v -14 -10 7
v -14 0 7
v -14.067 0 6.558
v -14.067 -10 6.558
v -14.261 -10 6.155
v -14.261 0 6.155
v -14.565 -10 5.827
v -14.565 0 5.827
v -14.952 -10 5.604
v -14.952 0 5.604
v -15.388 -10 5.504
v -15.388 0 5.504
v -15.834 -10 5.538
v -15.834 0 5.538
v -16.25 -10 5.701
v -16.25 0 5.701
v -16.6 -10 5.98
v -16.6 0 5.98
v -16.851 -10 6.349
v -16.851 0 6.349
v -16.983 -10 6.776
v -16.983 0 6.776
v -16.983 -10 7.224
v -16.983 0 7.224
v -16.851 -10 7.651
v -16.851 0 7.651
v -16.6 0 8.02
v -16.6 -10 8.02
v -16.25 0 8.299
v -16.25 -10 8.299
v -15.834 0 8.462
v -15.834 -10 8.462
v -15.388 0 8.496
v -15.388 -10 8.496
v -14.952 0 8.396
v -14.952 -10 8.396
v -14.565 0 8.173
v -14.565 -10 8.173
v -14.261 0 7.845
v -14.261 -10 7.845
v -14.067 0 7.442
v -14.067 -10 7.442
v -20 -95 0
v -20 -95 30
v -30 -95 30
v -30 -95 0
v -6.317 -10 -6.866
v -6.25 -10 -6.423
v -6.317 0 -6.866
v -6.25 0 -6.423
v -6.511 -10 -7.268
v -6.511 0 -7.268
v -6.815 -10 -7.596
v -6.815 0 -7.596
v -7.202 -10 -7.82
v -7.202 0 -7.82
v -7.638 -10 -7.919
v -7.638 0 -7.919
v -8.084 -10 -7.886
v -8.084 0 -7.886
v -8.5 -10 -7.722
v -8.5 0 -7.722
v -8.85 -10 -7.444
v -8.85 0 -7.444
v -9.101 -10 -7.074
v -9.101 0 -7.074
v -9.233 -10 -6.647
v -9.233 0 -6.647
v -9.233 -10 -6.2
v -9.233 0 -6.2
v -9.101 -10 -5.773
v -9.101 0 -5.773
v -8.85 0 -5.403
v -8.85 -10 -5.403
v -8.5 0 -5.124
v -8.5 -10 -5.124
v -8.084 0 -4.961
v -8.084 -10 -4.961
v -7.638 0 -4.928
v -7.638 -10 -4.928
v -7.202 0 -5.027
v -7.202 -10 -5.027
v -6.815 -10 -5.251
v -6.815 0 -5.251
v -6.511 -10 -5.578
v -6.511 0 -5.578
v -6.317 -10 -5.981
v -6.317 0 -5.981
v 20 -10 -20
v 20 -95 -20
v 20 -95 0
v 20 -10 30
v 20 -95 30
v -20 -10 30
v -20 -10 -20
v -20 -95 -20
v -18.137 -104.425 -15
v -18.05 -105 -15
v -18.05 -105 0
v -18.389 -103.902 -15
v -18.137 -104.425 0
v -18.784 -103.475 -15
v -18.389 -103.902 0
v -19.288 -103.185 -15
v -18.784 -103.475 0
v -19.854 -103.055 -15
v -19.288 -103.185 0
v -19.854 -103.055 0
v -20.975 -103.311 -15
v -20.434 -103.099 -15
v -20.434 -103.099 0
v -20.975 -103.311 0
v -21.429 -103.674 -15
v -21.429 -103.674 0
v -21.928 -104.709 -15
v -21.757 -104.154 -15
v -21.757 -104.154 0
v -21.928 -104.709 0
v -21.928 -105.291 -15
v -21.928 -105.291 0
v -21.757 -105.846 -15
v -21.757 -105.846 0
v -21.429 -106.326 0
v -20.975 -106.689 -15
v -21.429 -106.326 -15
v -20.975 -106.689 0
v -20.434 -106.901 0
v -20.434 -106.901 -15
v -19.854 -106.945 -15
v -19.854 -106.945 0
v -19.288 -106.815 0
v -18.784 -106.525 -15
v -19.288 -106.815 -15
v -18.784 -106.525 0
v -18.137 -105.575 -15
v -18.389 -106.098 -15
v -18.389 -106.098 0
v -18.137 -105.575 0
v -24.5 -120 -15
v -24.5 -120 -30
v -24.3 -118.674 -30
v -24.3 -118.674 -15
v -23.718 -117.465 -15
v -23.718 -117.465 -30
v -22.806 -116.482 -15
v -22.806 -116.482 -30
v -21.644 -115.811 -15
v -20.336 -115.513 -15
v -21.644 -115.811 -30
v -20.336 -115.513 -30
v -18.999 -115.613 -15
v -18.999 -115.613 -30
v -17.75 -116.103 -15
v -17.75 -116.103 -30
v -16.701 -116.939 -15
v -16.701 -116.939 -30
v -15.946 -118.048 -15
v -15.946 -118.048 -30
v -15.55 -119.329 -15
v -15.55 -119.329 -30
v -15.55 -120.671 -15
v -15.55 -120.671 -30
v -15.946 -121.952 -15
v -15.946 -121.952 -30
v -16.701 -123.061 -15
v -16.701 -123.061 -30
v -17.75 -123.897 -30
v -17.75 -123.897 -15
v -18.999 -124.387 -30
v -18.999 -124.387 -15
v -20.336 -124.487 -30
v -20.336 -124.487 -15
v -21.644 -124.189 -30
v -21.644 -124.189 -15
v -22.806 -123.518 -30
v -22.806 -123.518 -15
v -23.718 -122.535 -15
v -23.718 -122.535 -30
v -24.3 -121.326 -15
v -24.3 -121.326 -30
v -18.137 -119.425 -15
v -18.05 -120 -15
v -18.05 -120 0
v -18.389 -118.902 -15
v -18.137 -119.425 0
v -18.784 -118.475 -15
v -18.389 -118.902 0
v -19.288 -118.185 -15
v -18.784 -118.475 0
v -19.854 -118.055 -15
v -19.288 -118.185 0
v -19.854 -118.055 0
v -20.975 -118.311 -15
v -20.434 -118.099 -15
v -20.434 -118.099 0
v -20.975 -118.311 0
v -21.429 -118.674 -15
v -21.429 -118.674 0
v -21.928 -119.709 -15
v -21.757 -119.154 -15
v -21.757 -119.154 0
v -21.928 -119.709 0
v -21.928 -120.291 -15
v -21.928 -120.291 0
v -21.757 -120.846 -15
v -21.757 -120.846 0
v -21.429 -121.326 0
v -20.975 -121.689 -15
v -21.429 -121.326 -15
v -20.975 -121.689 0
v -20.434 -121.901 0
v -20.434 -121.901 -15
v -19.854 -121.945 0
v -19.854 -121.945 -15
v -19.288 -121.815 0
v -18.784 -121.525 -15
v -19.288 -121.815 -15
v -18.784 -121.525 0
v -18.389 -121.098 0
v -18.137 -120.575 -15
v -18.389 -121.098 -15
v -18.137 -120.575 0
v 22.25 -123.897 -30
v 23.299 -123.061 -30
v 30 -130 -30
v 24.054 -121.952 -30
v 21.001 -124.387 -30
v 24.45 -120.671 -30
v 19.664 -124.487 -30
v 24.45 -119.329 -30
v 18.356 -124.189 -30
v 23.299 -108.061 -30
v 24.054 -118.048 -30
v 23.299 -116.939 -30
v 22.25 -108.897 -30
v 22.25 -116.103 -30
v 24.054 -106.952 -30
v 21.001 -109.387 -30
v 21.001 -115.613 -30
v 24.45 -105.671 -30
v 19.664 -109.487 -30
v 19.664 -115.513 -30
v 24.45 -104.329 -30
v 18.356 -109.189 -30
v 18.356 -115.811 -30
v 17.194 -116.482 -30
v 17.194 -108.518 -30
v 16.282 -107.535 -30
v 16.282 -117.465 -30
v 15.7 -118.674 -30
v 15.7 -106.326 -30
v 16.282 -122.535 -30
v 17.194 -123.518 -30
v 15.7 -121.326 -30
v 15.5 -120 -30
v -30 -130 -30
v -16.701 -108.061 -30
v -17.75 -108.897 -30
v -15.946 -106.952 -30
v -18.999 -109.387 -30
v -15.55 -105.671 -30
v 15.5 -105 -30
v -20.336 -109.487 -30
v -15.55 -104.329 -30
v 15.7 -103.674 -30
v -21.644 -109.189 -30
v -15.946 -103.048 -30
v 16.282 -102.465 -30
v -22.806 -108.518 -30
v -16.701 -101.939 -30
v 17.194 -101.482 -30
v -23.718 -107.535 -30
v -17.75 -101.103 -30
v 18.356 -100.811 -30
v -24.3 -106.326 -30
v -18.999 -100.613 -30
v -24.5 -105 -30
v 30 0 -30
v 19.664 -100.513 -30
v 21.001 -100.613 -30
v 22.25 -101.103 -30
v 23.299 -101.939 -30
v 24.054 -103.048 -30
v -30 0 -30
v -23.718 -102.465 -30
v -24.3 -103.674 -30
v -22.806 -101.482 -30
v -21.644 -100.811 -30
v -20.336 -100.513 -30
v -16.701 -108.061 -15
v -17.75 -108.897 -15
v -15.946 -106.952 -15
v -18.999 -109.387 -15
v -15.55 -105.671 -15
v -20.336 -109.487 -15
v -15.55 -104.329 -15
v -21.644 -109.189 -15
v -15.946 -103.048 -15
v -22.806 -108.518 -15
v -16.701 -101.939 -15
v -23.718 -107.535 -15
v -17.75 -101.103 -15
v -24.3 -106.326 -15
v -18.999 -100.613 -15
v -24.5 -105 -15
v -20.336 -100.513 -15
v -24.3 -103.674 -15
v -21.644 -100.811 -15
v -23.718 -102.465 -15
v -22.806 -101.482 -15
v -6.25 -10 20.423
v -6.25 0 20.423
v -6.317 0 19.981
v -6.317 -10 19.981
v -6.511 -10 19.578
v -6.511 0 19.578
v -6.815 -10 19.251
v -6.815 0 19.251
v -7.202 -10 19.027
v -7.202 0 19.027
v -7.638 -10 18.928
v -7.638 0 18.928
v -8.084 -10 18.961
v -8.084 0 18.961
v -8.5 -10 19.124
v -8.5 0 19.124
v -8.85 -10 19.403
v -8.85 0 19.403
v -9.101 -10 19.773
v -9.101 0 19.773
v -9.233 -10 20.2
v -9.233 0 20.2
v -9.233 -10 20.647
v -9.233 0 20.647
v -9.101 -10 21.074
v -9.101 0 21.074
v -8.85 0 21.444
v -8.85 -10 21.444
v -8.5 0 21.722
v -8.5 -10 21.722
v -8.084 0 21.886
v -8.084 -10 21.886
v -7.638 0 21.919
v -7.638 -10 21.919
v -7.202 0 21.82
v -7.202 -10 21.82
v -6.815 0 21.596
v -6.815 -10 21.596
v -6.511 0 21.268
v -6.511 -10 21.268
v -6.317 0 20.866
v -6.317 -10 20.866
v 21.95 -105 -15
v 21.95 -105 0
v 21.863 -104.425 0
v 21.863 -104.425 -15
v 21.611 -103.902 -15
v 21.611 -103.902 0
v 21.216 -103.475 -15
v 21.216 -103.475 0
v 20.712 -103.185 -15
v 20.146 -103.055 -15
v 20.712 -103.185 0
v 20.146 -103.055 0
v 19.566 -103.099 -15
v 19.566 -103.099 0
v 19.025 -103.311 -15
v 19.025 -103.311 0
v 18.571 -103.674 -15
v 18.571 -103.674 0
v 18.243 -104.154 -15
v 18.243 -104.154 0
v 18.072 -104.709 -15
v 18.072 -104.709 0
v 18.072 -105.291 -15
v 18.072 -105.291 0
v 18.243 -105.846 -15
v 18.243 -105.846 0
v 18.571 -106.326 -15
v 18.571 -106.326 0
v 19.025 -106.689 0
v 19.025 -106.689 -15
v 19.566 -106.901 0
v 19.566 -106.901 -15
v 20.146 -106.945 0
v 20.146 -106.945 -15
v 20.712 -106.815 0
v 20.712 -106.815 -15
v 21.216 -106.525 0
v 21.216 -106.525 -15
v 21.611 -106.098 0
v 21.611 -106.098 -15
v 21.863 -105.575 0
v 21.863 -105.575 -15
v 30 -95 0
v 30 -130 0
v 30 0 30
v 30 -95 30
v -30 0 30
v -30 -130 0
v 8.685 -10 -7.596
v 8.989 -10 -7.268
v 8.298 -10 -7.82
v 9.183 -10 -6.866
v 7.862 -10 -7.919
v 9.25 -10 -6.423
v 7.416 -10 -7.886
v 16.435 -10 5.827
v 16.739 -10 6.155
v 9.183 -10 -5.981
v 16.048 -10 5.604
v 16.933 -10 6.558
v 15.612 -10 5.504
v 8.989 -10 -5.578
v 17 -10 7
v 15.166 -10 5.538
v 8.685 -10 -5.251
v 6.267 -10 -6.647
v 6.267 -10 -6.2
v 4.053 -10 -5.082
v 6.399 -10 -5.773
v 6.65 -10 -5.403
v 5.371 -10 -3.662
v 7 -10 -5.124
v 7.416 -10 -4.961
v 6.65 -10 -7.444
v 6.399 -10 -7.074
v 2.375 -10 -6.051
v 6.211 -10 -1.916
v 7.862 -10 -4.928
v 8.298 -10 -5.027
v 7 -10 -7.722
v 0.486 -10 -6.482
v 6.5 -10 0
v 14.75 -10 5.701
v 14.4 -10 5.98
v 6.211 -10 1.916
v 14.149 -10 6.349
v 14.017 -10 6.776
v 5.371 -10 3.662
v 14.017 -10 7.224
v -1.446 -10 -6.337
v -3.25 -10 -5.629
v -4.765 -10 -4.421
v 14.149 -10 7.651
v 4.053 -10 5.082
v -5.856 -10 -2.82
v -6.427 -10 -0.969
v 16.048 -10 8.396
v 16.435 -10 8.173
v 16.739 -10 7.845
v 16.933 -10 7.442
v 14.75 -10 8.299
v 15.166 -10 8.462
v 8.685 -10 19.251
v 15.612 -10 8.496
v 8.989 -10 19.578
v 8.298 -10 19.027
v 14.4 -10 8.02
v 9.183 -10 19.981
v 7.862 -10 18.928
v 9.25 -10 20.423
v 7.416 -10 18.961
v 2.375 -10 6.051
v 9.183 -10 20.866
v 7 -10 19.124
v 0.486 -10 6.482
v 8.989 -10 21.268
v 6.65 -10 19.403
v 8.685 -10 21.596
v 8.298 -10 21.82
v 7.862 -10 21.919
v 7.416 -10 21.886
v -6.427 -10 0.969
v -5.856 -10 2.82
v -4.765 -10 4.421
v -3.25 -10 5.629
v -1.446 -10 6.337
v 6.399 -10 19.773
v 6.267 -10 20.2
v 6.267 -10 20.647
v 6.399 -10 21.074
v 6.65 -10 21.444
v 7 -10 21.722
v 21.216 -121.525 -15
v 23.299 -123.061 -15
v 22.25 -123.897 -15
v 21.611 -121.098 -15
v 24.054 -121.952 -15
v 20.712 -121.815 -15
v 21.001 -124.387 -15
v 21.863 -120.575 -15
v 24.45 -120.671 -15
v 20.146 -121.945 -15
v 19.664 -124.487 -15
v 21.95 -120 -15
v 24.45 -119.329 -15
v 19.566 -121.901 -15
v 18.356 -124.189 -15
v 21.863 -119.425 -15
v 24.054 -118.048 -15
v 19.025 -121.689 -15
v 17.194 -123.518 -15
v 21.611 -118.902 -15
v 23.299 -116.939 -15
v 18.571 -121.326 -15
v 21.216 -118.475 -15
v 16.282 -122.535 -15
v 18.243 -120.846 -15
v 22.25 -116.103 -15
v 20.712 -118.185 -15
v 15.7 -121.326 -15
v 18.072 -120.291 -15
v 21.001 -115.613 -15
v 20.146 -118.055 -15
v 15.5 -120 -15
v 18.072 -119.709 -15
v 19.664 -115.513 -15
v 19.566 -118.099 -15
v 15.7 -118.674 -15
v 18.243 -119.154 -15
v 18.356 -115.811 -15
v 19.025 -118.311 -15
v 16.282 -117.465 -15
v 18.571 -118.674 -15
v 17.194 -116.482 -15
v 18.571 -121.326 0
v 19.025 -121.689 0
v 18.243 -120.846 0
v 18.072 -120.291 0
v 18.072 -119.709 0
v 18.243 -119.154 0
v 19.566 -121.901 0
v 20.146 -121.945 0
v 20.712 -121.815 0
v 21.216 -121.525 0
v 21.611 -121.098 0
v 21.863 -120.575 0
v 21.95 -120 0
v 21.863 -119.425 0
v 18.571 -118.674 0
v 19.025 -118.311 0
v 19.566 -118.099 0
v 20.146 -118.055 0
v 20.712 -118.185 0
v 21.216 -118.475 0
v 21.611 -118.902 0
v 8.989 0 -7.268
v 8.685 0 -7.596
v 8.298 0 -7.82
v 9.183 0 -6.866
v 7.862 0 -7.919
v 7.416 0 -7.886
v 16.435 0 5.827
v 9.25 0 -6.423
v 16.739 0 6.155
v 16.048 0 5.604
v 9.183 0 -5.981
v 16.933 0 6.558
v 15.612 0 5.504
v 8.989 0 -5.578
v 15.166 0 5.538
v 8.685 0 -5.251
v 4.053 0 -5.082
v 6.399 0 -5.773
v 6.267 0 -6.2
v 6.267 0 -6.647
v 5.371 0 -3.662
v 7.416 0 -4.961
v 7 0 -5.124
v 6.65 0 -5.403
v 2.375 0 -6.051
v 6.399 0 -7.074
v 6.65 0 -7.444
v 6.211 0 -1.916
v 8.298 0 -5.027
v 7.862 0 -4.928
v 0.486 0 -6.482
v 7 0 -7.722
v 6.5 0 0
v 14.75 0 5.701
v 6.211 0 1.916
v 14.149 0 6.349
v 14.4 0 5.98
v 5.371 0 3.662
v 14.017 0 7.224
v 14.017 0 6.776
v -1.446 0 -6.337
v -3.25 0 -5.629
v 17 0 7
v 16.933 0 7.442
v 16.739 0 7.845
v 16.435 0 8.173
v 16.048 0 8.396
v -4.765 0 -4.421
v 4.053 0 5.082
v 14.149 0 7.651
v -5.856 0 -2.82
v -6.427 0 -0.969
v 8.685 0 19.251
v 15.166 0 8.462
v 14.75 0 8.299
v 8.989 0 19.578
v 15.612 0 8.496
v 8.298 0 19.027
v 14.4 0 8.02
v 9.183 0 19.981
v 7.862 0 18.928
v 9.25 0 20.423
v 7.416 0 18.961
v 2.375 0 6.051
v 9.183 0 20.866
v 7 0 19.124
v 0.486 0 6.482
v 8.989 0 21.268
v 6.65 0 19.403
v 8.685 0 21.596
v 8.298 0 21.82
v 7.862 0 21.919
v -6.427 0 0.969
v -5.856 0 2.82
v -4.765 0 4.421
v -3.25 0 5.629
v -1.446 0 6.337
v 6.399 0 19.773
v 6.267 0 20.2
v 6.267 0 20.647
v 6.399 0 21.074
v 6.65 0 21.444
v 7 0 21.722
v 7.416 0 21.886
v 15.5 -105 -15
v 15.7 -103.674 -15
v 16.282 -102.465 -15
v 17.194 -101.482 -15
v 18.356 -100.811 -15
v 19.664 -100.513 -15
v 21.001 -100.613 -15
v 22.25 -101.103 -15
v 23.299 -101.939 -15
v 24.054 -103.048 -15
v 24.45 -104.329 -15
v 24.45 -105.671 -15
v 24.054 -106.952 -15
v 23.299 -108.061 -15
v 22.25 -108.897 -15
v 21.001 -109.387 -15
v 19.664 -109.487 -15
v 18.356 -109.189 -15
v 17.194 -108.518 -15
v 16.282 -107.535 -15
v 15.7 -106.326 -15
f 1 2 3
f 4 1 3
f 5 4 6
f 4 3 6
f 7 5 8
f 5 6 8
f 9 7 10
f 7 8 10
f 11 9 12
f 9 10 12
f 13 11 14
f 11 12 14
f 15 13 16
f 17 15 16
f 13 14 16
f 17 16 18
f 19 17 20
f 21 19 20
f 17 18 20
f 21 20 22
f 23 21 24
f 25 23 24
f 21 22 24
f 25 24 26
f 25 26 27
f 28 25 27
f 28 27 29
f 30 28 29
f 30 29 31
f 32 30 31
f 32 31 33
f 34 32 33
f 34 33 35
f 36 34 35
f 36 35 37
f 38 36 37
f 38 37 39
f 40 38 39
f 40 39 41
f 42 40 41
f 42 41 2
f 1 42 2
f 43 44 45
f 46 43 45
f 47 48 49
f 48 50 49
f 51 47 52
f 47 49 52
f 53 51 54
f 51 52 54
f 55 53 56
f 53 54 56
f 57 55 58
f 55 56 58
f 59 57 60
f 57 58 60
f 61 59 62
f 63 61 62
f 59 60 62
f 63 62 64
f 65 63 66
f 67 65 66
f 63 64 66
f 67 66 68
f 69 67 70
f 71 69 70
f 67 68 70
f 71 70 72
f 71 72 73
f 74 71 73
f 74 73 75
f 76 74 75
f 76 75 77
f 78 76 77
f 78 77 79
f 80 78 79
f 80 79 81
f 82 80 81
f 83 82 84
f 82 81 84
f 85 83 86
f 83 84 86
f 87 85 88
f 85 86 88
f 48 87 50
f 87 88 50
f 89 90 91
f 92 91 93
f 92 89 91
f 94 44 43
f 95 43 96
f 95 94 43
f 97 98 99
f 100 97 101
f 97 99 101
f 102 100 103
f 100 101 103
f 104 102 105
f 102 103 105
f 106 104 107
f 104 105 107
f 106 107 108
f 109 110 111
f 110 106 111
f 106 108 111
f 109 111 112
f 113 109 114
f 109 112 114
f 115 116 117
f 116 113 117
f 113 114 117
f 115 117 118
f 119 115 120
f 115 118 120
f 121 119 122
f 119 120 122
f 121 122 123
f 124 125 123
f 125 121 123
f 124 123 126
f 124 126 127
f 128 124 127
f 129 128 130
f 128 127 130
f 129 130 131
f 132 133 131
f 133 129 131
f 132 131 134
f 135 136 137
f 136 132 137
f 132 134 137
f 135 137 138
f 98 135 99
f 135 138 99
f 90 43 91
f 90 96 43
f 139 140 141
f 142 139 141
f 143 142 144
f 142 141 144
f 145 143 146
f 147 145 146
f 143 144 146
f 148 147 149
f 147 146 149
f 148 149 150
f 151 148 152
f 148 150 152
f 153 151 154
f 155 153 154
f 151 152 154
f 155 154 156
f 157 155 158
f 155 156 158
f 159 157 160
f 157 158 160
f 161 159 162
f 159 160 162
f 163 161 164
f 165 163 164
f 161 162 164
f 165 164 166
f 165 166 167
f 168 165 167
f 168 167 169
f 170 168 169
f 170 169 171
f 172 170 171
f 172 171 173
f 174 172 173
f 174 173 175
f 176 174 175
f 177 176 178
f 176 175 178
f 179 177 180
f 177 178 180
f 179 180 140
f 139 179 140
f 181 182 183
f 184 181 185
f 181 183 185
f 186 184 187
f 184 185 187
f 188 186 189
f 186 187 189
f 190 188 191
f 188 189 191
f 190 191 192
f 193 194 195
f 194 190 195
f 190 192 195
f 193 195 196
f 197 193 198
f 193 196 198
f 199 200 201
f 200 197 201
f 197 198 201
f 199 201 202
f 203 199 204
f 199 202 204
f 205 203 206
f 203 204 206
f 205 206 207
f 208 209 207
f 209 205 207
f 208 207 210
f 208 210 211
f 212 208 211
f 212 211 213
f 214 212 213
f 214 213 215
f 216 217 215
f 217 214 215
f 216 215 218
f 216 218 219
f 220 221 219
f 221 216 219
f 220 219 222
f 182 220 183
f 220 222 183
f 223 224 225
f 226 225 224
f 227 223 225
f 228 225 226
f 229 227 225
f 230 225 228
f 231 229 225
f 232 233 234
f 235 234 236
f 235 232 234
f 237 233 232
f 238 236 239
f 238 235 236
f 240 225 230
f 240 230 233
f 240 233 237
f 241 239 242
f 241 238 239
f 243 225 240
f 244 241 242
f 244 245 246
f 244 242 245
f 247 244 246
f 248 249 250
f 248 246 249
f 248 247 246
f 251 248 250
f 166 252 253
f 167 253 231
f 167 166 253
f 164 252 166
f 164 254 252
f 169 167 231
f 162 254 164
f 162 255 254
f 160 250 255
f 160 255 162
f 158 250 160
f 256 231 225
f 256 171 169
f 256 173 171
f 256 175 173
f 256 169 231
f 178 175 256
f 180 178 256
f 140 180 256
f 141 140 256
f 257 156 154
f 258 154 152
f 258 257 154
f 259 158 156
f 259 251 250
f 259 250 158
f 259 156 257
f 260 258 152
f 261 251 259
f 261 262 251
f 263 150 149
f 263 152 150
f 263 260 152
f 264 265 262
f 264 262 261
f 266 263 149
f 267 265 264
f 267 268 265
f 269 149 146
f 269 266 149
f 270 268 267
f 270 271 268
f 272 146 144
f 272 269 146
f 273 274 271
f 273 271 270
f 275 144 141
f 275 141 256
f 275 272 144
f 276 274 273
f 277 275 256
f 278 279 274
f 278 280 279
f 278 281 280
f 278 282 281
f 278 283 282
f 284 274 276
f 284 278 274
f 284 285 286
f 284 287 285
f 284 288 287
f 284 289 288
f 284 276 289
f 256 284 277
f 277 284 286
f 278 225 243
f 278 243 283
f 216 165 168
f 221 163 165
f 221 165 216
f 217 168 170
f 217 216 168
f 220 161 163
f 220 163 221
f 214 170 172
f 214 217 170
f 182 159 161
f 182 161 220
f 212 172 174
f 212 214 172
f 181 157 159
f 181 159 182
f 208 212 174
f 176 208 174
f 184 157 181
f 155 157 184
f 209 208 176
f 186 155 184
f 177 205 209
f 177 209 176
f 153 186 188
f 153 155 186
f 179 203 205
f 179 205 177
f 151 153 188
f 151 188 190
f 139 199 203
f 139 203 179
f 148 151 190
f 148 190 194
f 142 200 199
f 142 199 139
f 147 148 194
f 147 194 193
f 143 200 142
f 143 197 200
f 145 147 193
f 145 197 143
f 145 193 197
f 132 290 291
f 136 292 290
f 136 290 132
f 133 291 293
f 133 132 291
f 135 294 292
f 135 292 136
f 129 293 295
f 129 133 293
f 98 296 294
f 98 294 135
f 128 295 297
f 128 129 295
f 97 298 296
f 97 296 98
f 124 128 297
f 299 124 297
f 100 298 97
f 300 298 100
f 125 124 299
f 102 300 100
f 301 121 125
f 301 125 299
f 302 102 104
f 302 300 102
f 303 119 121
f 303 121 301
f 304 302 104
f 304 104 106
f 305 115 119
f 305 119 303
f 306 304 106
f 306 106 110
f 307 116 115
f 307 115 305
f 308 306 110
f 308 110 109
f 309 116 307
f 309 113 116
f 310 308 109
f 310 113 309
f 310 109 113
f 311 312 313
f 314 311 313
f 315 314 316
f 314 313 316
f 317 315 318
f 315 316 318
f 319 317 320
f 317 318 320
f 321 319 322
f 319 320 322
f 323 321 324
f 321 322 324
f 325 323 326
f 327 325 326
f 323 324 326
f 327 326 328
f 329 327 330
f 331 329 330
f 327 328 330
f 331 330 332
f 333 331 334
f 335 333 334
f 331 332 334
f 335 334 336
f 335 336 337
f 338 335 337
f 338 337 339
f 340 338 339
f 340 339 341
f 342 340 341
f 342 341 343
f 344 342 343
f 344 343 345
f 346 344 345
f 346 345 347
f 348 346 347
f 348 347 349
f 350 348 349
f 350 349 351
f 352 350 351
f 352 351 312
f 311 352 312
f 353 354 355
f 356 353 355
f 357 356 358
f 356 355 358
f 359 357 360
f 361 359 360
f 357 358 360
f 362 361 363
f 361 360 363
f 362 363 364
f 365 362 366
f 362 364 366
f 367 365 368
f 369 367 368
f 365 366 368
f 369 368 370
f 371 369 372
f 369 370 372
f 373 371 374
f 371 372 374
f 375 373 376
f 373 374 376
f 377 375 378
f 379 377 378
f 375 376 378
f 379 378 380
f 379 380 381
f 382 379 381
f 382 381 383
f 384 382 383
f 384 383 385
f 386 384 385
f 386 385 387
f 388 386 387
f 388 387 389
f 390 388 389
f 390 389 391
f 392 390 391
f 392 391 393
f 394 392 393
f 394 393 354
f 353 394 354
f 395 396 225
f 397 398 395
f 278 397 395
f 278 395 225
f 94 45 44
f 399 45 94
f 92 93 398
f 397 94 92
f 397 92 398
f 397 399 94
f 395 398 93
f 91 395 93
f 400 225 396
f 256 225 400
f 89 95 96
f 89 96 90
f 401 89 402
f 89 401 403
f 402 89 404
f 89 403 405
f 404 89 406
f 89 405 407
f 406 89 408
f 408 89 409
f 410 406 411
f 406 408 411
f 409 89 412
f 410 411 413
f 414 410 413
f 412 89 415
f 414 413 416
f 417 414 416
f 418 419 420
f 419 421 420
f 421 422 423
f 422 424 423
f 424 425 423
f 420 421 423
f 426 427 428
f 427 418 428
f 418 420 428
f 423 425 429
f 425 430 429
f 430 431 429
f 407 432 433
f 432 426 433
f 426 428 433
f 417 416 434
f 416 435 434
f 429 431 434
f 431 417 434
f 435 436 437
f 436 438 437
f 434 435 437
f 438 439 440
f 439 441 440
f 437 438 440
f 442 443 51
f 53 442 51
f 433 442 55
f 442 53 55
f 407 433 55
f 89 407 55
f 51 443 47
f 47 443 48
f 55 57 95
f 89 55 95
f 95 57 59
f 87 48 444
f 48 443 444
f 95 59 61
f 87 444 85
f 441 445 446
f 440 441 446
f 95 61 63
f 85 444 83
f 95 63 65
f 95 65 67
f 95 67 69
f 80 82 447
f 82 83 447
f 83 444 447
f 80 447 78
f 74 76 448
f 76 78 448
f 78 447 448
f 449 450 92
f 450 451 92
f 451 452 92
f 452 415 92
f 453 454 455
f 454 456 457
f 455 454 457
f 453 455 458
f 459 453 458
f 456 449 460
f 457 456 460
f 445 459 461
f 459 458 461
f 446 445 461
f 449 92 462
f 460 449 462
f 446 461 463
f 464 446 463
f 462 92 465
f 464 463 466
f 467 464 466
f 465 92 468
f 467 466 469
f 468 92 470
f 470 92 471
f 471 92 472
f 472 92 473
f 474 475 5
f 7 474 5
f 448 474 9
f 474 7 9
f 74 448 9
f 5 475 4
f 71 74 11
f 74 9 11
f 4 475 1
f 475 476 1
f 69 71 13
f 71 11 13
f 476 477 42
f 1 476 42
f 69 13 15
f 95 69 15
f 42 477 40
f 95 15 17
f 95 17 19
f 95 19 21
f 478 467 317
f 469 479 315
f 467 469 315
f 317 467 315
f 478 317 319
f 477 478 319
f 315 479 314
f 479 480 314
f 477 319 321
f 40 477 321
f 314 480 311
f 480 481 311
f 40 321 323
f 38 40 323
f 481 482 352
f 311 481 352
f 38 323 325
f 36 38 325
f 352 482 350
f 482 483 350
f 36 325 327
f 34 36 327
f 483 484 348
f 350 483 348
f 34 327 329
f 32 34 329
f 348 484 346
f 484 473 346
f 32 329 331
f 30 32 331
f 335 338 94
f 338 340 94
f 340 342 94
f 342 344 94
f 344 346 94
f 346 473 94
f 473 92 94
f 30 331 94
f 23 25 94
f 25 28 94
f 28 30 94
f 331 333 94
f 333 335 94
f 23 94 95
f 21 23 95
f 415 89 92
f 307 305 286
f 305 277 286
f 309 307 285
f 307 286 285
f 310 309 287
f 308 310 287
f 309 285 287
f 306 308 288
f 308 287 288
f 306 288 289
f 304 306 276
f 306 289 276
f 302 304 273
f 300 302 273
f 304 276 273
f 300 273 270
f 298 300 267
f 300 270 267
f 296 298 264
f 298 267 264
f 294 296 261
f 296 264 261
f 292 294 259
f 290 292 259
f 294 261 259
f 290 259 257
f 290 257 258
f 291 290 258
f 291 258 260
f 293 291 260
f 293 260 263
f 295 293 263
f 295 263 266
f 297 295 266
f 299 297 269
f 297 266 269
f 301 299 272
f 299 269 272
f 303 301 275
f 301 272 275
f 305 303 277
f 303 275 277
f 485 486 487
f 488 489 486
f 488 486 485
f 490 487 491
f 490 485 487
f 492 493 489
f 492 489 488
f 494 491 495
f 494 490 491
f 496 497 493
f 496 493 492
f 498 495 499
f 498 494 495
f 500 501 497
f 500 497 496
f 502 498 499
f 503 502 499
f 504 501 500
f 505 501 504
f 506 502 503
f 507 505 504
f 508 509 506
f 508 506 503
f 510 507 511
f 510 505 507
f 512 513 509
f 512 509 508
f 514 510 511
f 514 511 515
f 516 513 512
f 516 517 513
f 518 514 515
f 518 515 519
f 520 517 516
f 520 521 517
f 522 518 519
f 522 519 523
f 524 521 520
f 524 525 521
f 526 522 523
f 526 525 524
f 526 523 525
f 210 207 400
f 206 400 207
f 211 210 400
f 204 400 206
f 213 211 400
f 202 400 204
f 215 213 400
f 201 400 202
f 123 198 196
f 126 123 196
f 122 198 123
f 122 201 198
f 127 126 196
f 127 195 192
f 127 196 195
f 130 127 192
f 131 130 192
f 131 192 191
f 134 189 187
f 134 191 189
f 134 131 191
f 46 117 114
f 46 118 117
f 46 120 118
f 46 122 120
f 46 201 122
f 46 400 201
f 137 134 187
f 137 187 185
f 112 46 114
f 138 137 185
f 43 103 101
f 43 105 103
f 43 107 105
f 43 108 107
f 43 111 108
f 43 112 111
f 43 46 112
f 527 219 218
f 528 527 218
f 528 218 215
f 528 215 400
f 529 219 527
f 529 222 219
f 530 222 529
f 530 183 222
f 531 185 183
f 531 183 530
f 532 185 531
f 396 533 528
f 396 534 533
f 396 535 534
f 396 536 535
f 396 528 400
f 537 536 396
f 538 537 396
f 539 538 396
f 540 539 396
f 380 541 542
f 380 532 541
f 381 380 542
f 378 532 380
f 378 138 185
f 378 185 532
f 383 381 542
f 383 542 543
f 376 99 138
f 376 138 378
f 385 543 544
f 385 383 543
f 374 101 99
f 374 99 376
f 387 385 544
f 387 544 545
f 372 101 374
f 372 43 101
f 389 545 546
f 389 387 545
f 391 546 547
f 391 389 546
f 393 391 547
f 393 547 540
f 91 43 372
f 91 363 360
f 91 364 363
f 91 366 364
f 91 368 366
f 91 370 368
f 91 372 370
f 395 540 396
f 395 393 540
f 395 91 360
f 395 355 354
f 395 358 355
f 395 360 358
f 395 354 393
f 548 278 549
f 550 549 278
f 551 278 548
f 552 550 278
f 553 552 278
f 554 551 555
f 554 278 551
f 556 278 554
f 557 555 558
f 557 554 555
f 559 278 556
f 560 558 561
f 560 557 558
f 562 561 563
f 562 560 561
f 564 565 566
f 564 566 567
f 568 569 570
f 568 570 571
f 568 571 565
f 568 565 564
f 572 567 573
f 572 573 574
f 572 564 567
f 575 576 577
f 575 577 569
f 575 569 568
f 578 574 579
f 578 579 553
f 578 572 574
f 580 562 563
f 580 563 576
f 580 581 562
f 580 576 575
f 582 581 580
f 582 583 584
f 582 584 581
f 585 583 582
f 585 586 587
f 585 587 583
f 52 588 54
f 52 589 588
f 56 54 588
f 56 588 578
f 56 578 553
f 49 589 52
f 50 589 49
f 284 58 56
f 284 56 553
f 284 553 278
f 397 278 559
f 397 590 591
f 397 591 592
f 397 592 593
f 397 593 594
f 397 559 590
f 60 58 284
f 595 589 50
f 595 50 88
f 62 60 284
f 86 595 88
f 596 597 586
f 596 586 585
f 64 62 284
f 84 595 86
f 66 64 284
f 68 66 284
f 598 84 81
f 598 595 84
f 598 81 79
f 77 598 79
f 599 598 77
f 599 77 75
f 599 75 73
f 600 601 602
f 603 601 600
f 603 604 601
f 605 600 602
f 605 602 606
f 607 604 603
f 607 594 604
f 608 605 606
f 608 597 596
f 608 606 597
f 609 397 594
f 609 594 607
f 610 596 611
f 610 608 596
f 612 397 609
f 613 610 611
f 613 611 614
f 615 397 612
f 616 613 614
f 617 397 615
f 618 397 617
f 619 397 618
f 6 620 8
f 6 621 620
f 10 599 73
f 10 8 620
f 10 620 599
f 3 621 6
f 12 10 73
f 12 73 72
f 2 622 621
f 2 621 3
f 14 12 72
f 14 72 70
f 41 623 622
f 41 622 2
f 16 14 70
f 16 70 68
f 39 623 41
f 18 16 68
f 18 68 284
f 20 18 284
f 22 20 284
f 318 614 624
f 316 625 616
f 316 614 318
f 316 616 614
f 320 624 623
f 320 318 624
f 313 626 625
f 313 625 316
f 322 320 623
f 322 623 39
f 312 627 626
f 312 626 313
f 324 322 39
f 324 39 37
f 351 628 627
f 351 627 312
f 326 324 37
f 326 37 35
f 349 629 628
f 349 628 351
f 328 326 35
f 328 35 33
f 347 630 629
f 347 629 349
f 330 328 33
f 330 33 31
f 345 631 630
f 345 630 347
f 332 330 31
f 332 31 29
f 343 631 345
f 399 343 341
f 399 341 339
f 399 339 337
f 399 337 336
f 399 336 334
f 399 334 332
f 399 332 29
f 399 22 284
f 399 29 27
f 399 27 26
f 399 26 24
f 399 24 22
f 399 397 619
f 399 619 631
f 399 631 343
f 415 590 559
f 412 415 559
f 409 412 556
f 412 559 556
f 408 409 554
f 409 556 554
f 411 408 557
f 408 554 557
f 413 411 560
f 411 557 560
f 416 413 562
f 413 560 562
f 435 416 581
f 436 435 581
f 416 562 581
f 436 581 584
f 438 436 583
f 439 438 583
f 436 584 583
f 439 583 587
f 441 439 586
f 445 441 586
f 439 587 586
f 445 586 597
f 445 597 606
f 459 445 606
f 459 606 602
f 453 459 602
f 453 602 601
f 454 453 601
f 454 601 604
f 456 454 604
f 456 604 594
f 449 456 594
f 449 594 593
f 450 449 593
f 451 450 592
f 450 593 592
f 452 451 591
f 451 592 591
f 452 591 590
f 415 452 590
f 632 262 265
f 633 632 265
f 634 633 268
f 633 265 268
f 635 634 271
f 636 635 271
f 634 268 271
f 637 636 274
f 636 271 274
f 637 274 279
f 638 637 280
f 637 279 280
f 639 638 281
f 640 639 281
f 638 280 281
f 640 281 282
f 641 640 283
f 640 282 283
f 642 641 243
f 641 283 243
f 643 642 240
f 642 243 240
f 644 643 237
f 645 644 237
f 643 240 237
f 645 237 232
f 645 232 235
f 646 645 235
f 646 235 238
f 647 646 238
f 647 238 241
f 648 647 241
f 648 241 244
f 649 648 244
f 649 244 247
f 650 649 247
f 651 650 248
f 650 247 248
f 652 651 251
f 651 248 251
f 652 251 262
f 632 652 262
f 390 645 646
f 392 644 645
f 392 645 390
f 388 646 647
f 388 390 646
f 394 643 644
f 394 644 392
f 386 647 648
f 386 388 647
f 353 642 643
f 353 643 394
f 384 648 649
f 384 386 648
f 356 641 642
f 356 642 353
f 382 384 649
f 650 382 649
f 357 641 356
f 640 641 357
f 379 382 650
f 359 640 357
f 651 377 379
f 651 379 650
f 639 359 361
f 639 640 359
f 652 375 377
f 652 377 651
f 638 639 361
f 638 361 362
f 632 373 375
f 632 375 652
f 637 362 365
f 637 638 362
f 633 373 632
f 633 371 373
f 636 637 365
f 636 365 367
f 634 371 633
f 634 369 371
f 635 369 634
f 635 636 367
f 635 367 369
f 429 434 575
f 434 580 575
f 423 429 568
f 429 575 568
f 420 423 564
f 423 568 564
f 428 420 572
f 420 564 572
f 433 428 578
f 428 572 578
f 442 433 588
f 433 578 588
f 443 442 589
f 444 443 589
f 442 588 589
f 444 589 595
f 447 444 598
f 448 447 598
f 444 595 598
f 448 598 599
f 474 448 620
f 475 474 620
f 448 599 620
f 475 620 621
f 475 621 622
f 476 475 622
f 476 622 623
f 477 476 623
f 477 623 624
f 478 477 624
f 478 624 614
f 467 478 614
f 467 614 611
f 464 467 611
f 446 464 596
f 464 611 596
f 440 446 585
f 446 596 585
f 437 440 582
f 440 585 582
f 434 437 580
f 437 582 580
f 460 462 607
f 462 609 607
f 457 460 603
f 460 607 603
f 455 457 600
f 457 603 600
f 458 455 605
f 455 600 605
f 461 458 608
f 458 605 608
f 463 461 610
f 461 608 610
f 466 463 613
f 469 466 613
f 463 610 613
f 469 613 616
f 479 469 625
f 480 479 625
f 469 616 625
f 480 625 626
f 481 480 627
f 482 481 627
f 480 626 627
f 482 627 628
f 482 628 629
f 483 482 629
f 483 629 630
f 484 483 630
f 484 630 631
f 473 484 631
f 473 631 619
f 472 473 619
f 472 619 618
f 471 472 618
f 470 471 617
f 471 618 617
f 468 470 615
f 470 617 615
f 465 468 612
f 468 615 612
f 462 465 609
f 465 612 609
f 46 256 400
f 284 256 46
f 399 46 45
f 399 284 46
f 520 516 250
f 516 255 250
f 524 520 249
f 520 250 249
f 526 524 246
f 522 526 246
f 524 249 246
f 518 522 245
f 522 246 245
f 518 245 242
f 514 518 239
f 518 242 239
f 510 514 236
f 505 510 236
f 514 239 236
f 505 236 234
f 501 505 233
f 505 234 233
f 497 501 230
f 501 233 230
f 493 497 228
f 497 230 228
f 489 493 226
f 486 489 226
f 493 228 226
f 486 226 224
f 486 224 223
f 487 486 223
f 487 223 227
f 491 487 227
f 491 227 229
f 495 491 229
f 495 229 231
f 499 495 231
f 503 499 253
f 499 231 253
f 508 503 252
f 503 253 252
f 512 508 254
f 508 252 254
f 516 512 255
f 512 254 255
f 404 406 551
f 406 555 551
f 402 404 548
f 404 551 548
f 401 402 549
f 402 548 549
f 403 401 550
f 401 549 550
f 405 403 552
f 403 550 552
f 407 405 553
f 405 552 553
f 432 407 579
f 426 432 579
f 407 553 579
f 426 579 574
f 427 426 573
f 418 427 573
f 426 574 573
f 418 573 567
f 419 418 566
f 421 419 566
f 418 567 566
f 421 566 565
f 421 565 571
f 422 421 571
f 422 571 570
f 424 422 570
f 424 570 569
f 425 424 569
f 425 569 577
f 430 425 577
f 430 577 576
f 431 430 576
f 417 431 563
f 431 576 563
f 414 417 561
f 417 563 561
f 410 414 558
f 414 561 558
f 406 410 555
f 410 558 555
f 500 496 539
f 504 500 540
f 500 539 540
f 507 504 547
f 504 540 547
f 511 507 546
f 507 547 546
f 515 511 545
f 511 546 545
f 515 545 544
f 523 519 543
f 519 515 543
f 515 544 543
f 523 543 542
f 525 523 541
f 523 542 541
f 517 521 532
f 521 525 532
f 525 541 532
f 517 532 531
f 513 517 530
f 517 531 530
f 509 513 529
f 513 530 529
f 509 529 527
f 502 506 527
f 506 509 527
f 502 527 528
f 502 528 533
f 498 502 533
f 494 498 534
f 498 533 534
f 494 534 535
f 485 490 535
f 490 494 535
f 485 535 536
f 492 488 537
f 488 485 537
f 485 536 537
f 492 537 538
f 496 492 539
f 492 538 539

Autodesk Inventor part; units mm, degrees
ref_plane "YZ Plane" through (0, 0, 0) normal (1, 0, 0) x (0, 1, 0)
ref_plane "XZ Plane" through (0, 0, 0) normal (0, 1, 0) x (-1, 0, 0)
ref_plane "XY Plane" through (0, 0, 0) normal (0, 0, 1) x (1, 0, 0)
sketch "Sketch1" plane through (0, 0, 0) normal (0, 1, 0) x (-1, 0, 0)
  line L0 (30, 30) -> (-30, 30)
  line L1 (-30, 30) -> (-30, -30)
  line L2 (-30, -30) -> (30, -30)
  line L3 (30, -30) -> (30, 30)
  circle A0 centre (0, 0) radius 2.0484
  dimension "d0" = 60
  dimension "d1" = 60
  dimension "d2" = 30
  dimension "d3" = 30
extrude "Extrusion1" add sketch "Sketch1" against normal blind 10
sketch "Sketch2" plane through (0, -10, 0) normal (0, -1, 0) x (1, 0, 0)
  line L0 (30, -30) -> (30, 30) projected
  line L1 (-30, 30) -> (-30, -30) projected
  line L2 (30, 30) -> (-30, 30)
  line L3 (-30, 30) -> (-30, -30)
  line L4 (-30, -30) -> (30, -30)
  line L5 (30, -30) -> (30, 30)
  line L6 (20, 20) -> (-20, 20)
  line L7 (-20, 20) -> (-20, -20)
  line L8 (-20, -20) -> (20, -20)
  line L9 (20, -20) -> (20, 20)
  point P0 (0, 0)
  dimension "d6" = 10
  dimension "d7" = 10
  dimension "d8" = 10
  dimension "d9" = 10
extrude "Extrusion2" add sketch "Sketch2" along normal blind 120
sketch "Sketch3" plane through (-30, 0, 30) normal (0, 0, 1) x (1, 0, 0)
  point P0 (30, 0)
sketch "Sketch4" plane through (-30, 0, 30) normal (0, 0, 1) x (1, 0, 0)
  line L0 (50, -10) -> (10, -10) projected
  line L1 (50, -10) -> (50, -130) projected
  line L2 (10, -10) -> (50, -10)
  line L3 (50, -10) -> (50, -95)
  line L4 (50, -95) -> (10, -95)
  line L5 (10, -95) -> (10, -10)
  point P0 (30, 0)
  dimension "d12" = 85
extrude "Extrusion3" cut sketch "Sketch4" against normal blind 10
sketch "Sketch5" plane through (-30, 0, 30) normal (0, 0, 1) x (1, 0, 0)
  line L0 (60, 0) -> (60, -130) projected
  line L1 (60, -130) -> (0, -130) projected
  line L2 (60, -95) -> (0, -95)
  line L3 (0, -95) -> (0, -130)
  line L4 (0, -130) -> (60, -130)
  line L5 (60, -130) -> (60, -95)
  point P0 (30, 0)
  dimension "d16" = 35
extrude "Extrusion4" cut sketch "Sketch5" against normal blind 30
sketch "Sketch6" plane through (-20, -10, -20) normal (0, 0, 1) x (1, 0, 0)
  line L0 (-10, -85) -> (0, -85) projected
  line L1 (0, -85) -> (40, -85)
  line L2 (40, -85) -> (40, -120)
  line L3 (40, -120) -> (0, -120)
  line L4 (0, -120) -> (0, -85)
  point P0 (20, 10)
extrude "Extrusion5" add sketch "Sketch6" along normal blind 20
sketch "Sketch7" plane through (-30, 0, 0) normal (0, 0, 1) x (1, 0, 0)
  circle A0 centre (10, -105) radius 1.95
  circle A1 centre (10, -120) radius 1.95
  circle A2 centre (50, -105) radius 1.95
  circle A3 centre (50, -120) radius 1.95
  line L0 (60, -95) -> (60, -130) projected
  line L1 (60, -130) -> (0, -130) projected
  line L2 (50, -95) -> (60, -95) projected
  line L3 (50, -95) -> (10, -95) projected
  line L4 (0, -130) -> (0, -95) projected
  point P0 (30, 0)
  dimension "d21" = 10
  dimension "d22" = 10
  dimension "d23" = 10
  dimension "d24" = 10
  dimension "d25" = 10
  dimension "d26" = 10
  dimension "d27" = 10
  dimension "d28" = 10
  dimension "d29" = 3.9
  dimension "d30" = 3.9
  dimension "d31" = 3.9
  dimension "d32" = 3.9
extrude "Extrusion6" cut sketch "Sketch7" against normal blind 35
sketch "Sketch8" plane through (30, 0, -30) normal (0, 0, -1) x (-1, 0, 0)
  circle A0 centre (10, -105) radius 1.95 projected
  circle A1 centre (10, -105) radius 4.5
  circle A2 centre (10, -120) radius 1.95 projected
  circle A3 centre (10, -120) radius 4.5
  circle A4 centre (50, -105) radius 1.95 projected
  circle A5 centre (50, -105) radius 4.5
  circle A6 centre (50, -120) radius 1.95 projected
  circle A7 centre (50, -120) radius 4.5
  point P0 (30, 0)
  dimension "d35" = 9
  dimension "d36" = 9
  dimension "d37" = 9
  dimension "d38" = 9
extrude "Extrusion7" cut sketch "Sketch8" against normal blind 15 contours A0 | A1 | A3 | A5 | A7
sketch "Sketch9" plane through (0, 0, 0) normal (0, 1, 0) x (1, 0, 0)
  circle A0 centre (0, 0) radius 6.5
  circle A1 centre (0, -7) radius 15.5
  line L0 (30, -30) -> (30, 30) projected
  line L1 (0, -7) -> (-17.1994, -7)
  line L2 (-17.1994, -7) -> (16.6076, -7)
  line L3 (0, -7) -> (-8.5199, -21.7569)
  line L4 (0, -7) -> (9.3939, -23.2707)
  line L5 (0, -7) -> (10.7829, 11.6765)
  line L6 (0, -7) -> (-10.6515, 11.4489)
  circle A2 centre (7.75, 6.4234) radius 1.5
  circle A3 centre (-7.75, 6.4234) radius 1.5
  circle A4 centre (-15.5, -7) radius 1.5
  circle A5 centre (-7.75, -20.4234) radius 1.5
  circle A6 centre (7.75, -20.4234) radius 1.5
  circle A7 centre (15.5, -7) radius 1.5
  dimension "d44" = 13
  dimension "d45" = 31
  dimension "d46" = 7
  dimension "d47" = 30
  dimension "d48" = 60
  dimension "d49" = 60
  dimension "d50" = 60
  dimension "d51" = 60
  dimension "d52" = 3
  dimension "d53" = 3
  dimension "d54" = 3
  dimension "d55" = 3
  dimension "d56" = 3
  dimension "d57" = 3
extrude "Extrusion8" cut sketch "Sketch9" against normal blind 10 contours A0 L5 | L5 A0 L6 | L6 A0 | A2 A1 L5 | L5 A1 A2 | A3 A1 L6 | L6 A1 A3 | L5 A2 A1 | A1 A2 L5 | A4 A1 L1 | L1 A1 A4 | A7 A1 L2 | L2 A1 A7 | A5 A1 L3 | L3 A1 A5 | A6 A1 L4 | L4 A1 A6 | L6 A3 A1 | A1 A3 L6 | A7 A1 | L1 A4 A1 | A1 A4 L1 | L3 A5 A1 | A1 A5 L3 | L4 A6 A1 | A1 A6 L4 picked at (0.3591, 1.0442)
properties part number "Base_V2c"
